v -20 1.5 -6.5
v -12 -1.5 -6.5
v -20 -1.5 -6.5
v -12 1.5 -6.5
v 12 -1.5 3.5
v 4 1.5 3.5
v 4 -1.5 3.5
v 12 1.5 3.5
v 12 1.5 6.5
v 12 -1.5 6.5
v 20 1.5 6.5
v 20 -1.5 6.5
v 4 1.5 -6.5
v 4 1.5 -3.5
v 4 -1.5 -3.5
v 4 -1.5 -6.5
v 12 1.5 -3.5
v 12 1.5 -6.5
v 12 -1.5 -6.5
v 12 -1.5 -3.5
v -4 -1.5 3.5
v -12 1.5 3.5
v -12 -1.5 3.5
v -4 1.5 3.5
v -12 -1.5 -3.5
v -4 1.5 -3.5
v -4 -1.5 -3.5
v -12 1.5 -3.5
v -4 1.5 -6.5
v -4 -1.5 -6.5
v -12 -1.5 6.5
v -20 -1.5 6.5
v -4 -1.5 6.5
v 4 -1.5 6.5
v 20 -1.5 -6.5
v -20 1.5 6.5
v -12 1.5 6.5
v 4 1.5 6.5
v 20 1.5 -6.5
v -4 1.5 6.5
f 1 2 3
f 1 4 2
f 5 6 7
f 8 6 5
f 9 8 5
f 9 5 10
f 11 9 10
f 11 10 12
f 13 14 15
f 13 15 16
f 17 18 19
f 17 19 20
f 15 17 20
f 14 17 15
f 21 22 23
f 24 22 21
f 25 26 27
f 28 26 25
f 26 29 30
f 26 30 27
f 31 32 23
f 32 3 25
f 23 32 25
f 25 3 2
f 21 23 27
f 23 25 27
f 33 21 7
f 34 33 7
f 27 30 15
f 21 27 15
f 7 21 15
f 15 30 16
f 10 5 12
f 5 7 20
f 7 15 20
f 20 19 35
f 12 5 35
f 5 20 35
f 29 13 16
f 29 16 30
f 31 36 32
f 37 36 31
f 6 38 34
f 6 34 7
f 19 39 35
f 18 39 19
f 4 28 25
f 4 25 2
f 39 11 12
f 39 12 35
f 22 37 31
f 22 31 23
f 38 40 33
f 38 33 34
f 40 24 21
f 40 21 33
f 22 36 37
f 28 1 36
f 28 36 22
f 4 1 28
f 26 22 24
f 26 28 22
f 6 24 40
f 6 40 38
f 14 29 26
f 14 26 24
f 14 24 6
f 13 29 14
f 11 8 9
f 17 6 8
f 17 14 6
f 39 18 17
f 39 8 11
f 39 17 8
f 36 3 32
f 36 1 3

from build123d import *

# Parameters (mm, degrees)
ESTRUSIONE_ESTRUSIONE2_DEPTH = 1.5


with BuildPart() as part:
    # Schizzo3 → Estrusione-Estrusione2 (new body, symmetric)
    with BuildSketch(Plane(origin=(0, 0, 0), x_dir=(1, 0, 0), z_dir=(0, 1, 0))):
        Polygon((-20, -3.5), (-20, -6.5), (-12, -6.5), (-12, -3.5), (-4, -3.5), (-4, -6.5), (4, -6.5), (4, -3.5), (12, -3.5), (12, -6.5), (20, -6.5), (20, -3.5), (20, 3.5), (20, 6.5), (12, 6.5), (12, 3.5), (4, 3.5), (4, 6.5), (-4, 6.5), (-4, 3.5), (-12, 3.5), (-12, 6.5), (-20, 6.5), (-20, 3.5), align=None)
    extrude(amount=ESTRUSIONE_ESTRUSIONE2_DEPTH, both=True)


solid = part.part
